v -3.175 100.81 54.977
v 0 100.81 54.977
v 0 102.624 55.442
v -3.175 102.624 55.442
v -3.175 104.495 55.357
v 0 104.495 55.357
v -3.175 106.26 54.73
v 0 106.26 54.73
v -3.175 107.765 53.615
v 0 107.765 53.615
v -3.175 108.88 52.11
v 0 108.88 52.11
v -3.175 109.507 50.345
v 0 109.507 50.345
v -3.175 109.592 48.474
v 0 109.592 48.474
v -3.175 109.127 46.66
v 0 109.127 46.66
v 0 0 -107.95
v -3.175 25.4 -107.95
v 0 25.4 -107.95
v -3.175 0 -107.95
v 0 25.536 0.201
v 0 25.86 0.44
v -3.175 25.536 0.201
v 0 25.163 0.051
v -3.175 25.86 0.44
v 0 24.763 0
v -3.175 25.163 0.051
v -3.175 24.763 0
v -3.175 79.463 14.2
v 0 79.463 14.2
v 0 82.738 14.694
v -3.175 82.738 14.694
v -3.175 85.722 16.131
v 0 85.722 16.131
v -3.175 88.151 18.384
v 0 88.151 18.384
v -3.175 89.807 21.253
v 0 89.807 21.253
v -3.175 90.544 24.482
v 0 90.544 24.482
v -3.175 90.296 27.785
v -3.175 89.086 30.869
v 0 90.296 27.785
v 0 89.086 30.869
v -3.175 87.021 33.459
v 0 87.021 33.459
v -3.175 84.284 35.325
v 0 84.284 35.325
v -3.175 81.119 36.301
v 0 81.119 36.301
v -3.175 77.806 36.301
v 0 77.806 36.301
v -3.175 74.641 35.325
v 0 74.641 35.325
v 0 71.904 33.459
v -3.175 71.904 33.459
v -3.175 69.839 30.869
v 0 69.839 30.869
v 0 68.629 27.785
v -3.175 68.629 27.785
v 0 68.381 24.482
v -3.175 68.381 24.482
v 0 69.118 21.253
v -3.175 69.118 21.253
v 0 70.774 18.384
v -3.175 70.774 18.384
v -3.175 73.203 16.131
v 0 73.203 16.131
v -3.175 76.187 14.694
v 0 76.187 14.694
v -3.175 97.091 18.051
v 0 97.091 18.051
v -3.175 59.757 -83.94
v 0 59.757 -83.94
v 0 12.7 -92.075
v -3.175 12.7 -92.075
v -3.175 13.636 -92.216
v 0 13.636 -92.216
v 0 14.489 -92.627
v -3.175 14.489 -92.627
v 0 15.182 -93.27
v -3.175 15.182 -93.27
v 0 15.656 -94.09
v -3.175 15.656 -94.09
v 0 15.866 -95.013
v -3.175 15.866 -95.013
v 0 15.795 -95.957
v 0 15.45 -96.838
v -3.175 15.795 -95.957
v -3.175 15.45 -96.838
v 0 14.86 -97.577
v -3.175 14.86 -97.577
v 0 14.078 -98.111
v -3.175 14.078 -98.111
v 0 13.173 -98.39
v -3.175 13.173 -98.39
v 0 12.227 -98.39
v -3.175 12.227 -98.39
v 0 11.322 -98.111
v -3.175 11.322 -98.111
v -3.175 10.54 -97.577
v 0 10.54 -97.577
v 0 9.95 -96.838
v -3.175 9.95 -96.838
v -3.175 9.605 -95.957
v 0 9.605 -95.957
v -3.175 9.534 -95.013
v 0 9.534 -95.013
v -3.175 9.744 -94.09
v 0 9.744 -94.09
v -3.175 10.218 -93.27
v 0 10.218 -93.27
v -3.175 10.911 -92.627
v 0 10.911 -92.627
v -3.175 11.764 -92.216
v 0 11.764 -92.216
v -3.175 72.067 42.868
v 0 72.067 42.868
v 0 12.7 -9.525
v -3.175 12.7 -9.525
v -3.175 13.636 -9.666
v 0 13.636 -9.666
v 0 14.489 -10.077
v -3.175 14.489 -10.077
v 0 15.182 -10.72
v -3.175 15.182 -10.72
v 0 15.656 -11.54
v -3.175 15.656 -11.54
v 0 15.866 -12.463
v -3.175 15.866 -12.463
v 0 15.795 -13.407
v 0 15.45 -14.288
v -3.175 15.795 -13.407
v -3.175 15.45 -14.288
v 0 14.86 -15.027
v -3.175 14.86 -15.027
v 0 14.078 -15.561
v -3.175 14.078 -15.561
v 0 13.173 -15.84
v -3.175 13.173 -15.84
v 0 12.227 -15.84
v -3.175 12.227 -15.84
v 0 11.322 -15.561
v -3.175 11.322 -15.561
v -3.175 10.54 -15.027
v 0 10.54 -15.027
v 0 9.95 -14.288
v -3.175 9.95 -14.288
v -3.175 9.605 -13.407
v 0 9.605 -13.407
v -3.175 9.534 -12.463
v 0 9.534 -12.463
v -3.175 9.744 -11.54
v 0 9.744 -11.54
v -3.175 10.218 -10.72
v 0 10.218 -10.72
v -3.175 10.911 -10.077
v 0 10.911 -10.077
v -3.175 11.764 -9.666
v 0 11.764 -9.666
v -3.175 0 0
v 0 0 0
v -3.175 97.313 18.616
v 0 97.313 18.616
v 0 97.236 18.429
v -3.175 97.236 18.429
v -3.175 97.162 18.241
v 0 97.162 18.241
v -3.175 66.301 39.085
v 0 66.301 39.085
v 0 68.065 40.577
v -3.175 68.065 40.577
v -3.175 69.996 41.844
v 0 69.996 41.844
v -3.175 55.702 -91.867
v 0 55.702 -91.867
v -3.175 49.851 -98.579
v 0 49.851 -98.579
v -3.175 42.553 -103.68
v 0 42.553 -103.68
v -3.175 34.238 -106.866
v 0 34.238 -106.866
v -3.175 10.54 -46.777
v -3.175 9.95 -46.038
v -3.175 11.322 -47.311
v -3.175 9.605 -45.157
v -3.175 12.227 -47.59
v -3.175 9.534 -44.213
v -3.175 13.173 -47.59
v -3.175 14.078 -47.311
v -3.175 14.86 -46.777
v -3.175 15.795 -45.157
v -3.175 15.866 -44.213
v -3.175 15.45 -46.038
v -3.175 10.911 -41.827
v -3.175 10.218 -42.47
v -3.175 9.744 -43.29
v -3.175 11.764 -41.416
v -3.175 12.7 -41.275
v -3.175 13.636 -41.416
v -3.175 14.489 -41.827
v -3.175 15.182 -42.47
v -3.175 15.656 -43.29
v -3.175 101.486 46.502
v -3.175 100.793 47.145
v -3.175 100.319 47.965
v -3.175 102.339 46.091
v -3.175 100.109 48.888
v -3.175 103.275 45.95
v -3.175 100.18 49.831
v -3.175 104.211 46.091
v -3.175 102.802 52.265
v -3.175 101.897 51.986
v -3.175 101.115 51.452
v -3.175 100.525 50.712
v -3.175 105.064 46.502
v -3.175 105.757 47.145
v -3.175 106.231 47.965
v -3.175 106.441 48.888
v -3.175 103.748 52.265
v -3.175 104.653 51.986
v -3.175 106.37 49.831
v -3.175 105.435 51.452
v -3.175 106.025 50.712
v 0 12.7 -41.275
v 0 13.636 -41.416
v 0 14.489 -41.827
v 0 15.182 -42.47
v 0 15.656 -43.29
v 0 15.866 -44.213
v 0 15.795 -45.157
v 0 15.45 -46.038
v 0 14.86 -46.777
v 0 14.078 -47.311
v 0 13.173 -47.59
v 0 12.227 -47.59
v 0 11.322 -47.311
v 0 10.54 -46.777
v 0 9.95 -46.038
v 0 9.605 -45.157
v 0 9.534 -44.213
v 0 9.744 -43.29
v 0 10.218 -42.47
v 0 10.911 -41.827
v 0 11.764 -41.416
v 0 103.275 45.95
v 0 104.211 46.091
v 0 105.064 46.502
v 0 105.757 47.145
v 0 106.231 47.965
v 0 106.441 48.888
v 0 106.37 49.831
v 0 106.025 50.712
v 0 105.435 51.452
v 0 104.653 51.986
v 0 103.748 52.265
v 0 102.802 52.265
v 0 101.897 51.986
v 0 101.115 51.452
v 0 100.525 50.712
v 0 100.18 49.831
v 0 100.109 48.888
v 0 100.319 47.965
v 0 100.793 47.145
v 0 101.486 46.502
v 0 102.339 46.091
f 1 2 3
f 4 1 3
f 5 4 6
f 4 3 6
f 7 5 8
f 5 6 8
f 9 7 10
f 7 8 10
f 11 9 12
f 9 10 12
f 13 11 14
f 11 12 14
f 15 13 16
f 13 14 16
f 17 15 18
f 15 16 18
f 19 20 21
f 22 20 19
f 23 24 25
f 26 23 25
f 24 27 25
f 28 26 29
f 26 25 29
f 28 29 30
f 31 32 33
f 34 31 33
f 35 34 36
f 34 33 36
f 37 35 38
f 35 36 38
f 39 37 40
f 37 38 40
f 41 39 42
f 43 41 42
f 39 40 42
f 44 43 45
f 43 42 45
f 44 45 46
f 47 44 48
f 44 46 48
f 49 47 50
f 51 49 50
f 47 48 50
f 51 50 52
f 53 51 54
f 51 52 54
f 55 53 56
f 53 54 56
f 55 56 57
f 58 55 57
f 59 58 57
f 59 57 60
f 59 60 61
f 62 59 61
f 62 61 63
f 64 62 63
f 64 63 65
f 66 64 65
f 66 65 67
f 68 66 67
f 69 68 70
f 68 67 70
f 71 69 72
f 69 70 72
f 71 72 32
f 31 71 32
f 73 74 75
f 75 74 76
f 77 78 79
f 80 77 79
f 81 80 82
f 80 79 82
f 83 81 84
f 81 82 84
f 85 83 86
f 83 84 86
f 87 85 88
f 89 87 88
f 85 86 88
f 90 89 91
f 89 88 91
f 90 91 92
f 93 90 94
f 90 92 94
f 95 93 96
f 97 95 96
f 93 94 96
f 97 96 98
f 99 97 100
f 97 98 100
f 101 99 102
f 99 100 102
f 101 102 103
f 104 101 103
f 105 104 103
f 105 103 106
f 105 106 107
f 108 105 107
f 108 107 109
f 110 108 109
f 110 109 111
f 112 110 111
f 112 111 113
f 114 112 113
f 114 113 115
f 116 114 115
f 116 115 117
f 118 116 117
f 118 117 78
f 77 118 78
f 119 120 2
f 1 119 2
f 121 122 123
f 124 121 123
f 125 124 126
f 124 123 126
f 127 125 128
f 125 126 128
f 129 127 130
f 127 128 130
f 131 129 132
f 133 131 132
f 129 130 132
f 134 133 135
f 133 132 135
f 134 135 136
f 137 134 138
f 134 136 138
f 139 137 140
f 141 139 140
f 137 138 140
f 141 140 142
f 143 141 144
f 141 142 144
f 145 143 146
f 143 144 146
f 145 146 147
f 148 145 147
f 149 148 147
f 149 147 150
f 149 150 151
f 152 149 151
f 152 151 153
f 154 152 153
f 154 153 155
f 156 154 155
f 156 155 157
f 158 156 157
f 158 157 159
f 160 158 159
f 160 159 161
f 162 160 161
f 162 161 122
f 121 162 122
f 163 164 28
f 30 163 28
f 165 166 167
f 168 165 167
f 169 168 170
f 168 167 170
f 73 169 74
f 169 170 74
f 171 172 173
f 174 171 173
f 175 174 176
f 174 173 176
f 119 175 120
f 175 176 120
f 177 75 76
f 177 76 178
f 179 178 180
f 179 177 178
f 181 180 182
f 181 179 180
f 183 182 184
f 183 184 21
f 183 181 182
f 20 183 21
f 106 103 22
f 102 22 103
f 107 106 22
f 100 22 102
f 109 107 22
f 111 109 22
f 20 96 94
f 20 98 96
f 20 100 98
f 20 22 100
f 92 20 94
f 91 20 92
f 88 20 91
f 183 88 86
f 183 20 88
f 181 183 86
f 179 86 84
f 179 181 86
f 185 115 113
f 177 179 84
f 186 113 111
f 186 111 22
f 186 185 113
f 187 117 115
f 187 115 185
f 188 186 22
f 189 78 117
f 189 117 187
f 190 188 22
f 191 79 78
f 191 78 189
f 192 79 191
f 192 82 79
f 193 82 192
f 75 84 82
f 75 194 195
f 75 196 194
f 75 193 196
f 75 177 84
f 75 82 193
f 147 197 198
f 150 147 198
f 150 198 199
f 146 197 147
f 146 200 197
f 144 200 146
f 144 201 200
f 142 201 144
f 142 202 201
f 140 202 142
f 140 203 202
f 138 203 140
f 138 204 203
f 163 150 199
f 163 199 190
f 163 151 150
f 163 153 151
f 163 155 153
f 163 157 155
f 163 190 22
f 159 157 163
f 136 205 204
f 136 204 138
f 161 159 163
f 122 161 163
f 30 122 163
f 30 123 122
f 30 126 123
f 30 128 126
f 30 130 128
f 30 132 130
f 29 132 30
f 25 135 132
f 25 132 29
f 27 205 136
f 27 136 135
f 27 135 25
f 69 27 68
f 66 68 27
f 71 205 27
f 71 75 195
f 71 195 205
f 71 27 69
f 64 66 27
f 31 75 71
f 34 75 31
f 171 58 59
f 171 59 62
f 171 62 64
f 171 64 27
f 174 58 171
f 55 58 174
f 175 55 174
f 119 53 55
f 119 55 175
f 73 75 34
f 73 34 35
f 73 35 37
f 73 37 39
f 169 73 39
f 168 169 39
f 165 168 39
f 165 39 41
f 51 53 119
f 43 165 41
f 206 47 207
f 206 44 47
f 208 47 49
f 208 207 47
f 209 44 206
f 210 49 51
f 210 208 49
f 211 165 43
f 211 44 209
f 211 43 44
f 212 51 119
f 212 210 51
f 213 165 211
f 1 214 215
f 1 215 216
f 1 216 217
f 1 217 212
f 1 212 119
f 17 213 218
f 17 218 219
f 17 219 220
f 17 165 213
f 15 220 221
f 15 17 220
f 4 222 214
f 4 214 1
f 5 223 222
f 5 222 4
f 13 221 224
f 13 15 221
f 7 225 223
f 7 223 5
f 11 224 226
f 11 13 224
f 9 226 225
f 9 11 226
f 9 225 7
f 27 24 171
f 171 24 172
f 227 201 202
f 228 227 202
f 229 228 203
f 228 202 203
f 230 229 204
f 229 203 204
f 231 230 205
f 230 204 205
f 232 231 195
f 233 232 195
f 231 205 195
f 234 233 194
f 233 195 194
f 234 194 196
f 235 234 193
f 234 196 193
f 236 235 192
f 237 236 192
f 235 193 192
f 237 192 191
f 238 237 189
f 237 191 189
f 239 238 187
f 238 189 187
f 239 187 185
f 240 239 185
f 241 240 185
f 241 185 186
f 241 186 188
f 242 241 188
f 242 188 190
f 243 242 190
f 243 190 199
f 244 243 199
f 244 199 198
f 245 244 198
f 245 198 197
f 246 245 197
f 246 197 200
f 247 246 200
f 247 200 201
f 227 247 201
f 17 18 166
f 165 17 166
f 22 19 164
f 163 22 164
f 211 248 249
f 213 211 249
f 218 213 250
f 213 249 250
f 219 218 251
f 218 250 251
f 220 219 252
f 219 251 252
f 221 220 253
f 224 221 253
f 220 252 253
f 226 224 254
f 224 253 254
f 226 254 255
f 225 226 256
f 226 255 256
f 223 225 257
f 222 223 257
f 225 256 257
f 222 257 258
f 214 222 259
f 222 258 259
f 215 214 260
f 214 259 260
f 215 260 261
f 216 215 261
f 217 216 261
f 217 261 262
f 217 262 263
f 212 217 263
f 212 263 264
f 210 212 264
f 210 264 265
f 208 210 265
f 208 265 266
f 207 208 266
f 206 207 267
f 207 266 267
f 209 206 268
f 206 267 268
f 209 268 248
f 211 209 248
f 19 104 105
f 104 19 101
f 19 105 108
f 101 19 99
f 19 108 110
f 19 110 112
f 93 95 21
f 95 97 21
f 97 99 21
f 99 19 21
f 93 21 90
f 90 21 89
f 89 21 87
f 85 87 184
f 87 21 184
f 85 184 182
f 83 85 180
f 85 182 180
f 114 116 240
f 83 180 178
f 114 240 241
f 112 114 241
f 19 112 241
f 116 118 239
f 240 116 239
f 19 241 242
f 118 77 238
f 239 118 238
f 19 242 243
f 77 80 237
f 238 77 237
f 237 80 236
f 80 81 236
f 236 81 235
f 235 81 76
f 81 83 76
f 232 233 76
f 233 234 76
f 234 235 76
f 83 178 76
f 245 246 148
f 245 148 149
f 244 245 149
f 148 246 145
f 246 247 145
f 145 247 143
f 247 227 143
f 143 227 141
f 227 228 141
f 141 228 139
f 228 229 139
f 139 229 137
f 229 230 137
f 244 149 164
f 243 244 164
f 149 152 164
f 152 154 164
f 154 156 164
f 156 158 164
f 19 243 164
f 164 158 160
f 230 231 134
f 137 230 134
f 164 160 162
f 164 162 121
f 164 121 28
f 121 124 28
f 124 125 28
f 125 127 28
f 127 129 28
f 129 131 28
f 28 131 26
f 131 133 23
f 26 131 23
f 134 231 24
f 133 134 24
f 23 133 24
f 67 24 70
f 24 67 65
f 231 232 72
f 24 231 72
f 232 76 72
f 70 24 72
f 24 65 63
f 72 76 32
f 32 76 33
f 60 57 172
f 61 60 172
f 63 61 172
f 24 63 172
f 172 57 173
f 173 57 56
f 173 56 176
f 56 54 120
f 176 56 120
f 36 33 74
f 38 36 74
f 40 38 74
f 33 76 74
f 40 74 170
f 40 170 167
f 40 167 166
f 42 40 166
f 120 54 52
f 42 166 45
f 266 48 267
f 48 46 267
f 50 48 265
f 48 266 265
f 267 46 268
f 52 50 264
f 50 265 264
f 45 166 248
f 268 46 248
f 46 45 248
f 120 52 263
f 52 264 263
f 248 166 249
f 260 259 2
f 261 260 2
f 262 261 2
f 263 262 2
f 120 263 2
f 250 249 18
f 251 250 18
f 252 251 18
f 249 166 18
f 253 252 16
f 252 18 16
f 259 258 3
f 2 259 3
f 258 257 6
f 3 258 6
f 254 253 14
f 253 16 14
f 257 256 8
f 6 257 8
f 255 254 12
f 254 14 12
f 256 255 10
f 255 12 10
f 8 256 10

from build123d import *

# Parameters (mm, degrees)
SKETCH1_R          = 11.1125
BASE_FLANGE1_DEPTH = 3.175
SKETCH2_R          = 3.175
TAB1_DEPTH         = 3.175
SKETCH3_R          = 3.175
CUT_EXTRUDE1_DEPTH = 209.903242457
FILLET1_R          = 1.5875


# Sheet-metal steps are written as plain solids
with BuildPart() as part:
    # Sketch1 → Base-Flange1 (new body)
    with BuildSketch(Plane(origin=(0, 0, 0), x_dir=(0, 0, -1), z_dir=(1, 0, 0))):
        with BuildLine():
            Line((0, 0), (0, 25.4))
            Line((0, 25.4), (-39.085182146, 66.301387632))
            ThreePointArc((-39.085182146, 66.301387632), (-41.252321544, 89.894394258), (-18.764209654, 97.351691251))
            Line((-18.764209654, 97.351691251), (177.8, 25.4))
            Line((177.8, 25.4), (177.8, 0))
            Line((177.8, 0), (0, 0))
        make_face()
        with Locations((-25.3124843, 79.462515777)):
            Circle(SKETCH1_R, mode=Mode.SUBTRACT)
    extrude(amount=-BASE_FLANGE1_DEPTH)

    # Sketch2 → Tab1 (add)
    with BuildSketch(Plane(origin=(0, 0, 0), x_dir=(0, 0, -1), z_dir=(1, 0, 0))):
        with BuildLine():
            Line((-46.659727461, 109.126939283), (-18.616317191, 97.313010257))
            ThreePointArc((-18.616317191, 97.313010257), (-18.335147008, 97.198498454), (-18.051319944, 97.090740286))
            Line((-18.051319944, 97.090740286), (-18.764209654, 97.351691251))
            ThreePointArc((-18.764209654, 97.351691251), (-39.101007237, 92.607063514), (-42.868254817, 72.06674526))
            Line((-42.868254817, 72.06674526), (-54.976907806, 100.809758938))
            ThreePointArc((-54.976907806, 100.809758938), (-53.615112361, 107.765143837), (-46.659727461, 109.126939283))
        make_face()
        with Locations((-49.1249843, 103.275015777)):
            Circle(SKETCH2_R, mode=Mode.SUBTRACT)
    extrude(amount=-TAB1_DEPTH)

    # Sketch3 → Cut-Extrude1 (cut, through all)
    with BuildSketch(Plane.ZY.offset(3.175)):
        with Locations((-95.25, 12.7)):
            Circle(SKETCH3_R)
        with Locations((-12.7, 12.7)):
            Circle(SKETCH3_R)
        with Locations((-44.45, 12.7)):
            Circle(SKETCH3_R)
        with BuildLine():
            Line((-107.95, 25.4), (-107.95, 0))
            Line((-107.95, 0), (-177.8, 0))
            Line((-177.8, 0), (-177.8, 25.4))
            Line((-177.8, 25.4), (-83.93965963, 59.757273091))
            ThreePointArc((-83.93965963, 59.757273091), (-101.35258254, 46.357806773), (-107.95, 25.4))
        make_face()
    extrude(amount=-CUT_EXTRUDE1_DEPTH, mode=Mode.SUBTRACT)

    # Fillet1
    fillet1_edges = [part.edges().sort_by_distance(p)[0] for p in [
        (-1.5875, 25.4, 0),
    ]]
    fillet(fillet1_edges, radius=FILLET1_R)


solid = part.part
